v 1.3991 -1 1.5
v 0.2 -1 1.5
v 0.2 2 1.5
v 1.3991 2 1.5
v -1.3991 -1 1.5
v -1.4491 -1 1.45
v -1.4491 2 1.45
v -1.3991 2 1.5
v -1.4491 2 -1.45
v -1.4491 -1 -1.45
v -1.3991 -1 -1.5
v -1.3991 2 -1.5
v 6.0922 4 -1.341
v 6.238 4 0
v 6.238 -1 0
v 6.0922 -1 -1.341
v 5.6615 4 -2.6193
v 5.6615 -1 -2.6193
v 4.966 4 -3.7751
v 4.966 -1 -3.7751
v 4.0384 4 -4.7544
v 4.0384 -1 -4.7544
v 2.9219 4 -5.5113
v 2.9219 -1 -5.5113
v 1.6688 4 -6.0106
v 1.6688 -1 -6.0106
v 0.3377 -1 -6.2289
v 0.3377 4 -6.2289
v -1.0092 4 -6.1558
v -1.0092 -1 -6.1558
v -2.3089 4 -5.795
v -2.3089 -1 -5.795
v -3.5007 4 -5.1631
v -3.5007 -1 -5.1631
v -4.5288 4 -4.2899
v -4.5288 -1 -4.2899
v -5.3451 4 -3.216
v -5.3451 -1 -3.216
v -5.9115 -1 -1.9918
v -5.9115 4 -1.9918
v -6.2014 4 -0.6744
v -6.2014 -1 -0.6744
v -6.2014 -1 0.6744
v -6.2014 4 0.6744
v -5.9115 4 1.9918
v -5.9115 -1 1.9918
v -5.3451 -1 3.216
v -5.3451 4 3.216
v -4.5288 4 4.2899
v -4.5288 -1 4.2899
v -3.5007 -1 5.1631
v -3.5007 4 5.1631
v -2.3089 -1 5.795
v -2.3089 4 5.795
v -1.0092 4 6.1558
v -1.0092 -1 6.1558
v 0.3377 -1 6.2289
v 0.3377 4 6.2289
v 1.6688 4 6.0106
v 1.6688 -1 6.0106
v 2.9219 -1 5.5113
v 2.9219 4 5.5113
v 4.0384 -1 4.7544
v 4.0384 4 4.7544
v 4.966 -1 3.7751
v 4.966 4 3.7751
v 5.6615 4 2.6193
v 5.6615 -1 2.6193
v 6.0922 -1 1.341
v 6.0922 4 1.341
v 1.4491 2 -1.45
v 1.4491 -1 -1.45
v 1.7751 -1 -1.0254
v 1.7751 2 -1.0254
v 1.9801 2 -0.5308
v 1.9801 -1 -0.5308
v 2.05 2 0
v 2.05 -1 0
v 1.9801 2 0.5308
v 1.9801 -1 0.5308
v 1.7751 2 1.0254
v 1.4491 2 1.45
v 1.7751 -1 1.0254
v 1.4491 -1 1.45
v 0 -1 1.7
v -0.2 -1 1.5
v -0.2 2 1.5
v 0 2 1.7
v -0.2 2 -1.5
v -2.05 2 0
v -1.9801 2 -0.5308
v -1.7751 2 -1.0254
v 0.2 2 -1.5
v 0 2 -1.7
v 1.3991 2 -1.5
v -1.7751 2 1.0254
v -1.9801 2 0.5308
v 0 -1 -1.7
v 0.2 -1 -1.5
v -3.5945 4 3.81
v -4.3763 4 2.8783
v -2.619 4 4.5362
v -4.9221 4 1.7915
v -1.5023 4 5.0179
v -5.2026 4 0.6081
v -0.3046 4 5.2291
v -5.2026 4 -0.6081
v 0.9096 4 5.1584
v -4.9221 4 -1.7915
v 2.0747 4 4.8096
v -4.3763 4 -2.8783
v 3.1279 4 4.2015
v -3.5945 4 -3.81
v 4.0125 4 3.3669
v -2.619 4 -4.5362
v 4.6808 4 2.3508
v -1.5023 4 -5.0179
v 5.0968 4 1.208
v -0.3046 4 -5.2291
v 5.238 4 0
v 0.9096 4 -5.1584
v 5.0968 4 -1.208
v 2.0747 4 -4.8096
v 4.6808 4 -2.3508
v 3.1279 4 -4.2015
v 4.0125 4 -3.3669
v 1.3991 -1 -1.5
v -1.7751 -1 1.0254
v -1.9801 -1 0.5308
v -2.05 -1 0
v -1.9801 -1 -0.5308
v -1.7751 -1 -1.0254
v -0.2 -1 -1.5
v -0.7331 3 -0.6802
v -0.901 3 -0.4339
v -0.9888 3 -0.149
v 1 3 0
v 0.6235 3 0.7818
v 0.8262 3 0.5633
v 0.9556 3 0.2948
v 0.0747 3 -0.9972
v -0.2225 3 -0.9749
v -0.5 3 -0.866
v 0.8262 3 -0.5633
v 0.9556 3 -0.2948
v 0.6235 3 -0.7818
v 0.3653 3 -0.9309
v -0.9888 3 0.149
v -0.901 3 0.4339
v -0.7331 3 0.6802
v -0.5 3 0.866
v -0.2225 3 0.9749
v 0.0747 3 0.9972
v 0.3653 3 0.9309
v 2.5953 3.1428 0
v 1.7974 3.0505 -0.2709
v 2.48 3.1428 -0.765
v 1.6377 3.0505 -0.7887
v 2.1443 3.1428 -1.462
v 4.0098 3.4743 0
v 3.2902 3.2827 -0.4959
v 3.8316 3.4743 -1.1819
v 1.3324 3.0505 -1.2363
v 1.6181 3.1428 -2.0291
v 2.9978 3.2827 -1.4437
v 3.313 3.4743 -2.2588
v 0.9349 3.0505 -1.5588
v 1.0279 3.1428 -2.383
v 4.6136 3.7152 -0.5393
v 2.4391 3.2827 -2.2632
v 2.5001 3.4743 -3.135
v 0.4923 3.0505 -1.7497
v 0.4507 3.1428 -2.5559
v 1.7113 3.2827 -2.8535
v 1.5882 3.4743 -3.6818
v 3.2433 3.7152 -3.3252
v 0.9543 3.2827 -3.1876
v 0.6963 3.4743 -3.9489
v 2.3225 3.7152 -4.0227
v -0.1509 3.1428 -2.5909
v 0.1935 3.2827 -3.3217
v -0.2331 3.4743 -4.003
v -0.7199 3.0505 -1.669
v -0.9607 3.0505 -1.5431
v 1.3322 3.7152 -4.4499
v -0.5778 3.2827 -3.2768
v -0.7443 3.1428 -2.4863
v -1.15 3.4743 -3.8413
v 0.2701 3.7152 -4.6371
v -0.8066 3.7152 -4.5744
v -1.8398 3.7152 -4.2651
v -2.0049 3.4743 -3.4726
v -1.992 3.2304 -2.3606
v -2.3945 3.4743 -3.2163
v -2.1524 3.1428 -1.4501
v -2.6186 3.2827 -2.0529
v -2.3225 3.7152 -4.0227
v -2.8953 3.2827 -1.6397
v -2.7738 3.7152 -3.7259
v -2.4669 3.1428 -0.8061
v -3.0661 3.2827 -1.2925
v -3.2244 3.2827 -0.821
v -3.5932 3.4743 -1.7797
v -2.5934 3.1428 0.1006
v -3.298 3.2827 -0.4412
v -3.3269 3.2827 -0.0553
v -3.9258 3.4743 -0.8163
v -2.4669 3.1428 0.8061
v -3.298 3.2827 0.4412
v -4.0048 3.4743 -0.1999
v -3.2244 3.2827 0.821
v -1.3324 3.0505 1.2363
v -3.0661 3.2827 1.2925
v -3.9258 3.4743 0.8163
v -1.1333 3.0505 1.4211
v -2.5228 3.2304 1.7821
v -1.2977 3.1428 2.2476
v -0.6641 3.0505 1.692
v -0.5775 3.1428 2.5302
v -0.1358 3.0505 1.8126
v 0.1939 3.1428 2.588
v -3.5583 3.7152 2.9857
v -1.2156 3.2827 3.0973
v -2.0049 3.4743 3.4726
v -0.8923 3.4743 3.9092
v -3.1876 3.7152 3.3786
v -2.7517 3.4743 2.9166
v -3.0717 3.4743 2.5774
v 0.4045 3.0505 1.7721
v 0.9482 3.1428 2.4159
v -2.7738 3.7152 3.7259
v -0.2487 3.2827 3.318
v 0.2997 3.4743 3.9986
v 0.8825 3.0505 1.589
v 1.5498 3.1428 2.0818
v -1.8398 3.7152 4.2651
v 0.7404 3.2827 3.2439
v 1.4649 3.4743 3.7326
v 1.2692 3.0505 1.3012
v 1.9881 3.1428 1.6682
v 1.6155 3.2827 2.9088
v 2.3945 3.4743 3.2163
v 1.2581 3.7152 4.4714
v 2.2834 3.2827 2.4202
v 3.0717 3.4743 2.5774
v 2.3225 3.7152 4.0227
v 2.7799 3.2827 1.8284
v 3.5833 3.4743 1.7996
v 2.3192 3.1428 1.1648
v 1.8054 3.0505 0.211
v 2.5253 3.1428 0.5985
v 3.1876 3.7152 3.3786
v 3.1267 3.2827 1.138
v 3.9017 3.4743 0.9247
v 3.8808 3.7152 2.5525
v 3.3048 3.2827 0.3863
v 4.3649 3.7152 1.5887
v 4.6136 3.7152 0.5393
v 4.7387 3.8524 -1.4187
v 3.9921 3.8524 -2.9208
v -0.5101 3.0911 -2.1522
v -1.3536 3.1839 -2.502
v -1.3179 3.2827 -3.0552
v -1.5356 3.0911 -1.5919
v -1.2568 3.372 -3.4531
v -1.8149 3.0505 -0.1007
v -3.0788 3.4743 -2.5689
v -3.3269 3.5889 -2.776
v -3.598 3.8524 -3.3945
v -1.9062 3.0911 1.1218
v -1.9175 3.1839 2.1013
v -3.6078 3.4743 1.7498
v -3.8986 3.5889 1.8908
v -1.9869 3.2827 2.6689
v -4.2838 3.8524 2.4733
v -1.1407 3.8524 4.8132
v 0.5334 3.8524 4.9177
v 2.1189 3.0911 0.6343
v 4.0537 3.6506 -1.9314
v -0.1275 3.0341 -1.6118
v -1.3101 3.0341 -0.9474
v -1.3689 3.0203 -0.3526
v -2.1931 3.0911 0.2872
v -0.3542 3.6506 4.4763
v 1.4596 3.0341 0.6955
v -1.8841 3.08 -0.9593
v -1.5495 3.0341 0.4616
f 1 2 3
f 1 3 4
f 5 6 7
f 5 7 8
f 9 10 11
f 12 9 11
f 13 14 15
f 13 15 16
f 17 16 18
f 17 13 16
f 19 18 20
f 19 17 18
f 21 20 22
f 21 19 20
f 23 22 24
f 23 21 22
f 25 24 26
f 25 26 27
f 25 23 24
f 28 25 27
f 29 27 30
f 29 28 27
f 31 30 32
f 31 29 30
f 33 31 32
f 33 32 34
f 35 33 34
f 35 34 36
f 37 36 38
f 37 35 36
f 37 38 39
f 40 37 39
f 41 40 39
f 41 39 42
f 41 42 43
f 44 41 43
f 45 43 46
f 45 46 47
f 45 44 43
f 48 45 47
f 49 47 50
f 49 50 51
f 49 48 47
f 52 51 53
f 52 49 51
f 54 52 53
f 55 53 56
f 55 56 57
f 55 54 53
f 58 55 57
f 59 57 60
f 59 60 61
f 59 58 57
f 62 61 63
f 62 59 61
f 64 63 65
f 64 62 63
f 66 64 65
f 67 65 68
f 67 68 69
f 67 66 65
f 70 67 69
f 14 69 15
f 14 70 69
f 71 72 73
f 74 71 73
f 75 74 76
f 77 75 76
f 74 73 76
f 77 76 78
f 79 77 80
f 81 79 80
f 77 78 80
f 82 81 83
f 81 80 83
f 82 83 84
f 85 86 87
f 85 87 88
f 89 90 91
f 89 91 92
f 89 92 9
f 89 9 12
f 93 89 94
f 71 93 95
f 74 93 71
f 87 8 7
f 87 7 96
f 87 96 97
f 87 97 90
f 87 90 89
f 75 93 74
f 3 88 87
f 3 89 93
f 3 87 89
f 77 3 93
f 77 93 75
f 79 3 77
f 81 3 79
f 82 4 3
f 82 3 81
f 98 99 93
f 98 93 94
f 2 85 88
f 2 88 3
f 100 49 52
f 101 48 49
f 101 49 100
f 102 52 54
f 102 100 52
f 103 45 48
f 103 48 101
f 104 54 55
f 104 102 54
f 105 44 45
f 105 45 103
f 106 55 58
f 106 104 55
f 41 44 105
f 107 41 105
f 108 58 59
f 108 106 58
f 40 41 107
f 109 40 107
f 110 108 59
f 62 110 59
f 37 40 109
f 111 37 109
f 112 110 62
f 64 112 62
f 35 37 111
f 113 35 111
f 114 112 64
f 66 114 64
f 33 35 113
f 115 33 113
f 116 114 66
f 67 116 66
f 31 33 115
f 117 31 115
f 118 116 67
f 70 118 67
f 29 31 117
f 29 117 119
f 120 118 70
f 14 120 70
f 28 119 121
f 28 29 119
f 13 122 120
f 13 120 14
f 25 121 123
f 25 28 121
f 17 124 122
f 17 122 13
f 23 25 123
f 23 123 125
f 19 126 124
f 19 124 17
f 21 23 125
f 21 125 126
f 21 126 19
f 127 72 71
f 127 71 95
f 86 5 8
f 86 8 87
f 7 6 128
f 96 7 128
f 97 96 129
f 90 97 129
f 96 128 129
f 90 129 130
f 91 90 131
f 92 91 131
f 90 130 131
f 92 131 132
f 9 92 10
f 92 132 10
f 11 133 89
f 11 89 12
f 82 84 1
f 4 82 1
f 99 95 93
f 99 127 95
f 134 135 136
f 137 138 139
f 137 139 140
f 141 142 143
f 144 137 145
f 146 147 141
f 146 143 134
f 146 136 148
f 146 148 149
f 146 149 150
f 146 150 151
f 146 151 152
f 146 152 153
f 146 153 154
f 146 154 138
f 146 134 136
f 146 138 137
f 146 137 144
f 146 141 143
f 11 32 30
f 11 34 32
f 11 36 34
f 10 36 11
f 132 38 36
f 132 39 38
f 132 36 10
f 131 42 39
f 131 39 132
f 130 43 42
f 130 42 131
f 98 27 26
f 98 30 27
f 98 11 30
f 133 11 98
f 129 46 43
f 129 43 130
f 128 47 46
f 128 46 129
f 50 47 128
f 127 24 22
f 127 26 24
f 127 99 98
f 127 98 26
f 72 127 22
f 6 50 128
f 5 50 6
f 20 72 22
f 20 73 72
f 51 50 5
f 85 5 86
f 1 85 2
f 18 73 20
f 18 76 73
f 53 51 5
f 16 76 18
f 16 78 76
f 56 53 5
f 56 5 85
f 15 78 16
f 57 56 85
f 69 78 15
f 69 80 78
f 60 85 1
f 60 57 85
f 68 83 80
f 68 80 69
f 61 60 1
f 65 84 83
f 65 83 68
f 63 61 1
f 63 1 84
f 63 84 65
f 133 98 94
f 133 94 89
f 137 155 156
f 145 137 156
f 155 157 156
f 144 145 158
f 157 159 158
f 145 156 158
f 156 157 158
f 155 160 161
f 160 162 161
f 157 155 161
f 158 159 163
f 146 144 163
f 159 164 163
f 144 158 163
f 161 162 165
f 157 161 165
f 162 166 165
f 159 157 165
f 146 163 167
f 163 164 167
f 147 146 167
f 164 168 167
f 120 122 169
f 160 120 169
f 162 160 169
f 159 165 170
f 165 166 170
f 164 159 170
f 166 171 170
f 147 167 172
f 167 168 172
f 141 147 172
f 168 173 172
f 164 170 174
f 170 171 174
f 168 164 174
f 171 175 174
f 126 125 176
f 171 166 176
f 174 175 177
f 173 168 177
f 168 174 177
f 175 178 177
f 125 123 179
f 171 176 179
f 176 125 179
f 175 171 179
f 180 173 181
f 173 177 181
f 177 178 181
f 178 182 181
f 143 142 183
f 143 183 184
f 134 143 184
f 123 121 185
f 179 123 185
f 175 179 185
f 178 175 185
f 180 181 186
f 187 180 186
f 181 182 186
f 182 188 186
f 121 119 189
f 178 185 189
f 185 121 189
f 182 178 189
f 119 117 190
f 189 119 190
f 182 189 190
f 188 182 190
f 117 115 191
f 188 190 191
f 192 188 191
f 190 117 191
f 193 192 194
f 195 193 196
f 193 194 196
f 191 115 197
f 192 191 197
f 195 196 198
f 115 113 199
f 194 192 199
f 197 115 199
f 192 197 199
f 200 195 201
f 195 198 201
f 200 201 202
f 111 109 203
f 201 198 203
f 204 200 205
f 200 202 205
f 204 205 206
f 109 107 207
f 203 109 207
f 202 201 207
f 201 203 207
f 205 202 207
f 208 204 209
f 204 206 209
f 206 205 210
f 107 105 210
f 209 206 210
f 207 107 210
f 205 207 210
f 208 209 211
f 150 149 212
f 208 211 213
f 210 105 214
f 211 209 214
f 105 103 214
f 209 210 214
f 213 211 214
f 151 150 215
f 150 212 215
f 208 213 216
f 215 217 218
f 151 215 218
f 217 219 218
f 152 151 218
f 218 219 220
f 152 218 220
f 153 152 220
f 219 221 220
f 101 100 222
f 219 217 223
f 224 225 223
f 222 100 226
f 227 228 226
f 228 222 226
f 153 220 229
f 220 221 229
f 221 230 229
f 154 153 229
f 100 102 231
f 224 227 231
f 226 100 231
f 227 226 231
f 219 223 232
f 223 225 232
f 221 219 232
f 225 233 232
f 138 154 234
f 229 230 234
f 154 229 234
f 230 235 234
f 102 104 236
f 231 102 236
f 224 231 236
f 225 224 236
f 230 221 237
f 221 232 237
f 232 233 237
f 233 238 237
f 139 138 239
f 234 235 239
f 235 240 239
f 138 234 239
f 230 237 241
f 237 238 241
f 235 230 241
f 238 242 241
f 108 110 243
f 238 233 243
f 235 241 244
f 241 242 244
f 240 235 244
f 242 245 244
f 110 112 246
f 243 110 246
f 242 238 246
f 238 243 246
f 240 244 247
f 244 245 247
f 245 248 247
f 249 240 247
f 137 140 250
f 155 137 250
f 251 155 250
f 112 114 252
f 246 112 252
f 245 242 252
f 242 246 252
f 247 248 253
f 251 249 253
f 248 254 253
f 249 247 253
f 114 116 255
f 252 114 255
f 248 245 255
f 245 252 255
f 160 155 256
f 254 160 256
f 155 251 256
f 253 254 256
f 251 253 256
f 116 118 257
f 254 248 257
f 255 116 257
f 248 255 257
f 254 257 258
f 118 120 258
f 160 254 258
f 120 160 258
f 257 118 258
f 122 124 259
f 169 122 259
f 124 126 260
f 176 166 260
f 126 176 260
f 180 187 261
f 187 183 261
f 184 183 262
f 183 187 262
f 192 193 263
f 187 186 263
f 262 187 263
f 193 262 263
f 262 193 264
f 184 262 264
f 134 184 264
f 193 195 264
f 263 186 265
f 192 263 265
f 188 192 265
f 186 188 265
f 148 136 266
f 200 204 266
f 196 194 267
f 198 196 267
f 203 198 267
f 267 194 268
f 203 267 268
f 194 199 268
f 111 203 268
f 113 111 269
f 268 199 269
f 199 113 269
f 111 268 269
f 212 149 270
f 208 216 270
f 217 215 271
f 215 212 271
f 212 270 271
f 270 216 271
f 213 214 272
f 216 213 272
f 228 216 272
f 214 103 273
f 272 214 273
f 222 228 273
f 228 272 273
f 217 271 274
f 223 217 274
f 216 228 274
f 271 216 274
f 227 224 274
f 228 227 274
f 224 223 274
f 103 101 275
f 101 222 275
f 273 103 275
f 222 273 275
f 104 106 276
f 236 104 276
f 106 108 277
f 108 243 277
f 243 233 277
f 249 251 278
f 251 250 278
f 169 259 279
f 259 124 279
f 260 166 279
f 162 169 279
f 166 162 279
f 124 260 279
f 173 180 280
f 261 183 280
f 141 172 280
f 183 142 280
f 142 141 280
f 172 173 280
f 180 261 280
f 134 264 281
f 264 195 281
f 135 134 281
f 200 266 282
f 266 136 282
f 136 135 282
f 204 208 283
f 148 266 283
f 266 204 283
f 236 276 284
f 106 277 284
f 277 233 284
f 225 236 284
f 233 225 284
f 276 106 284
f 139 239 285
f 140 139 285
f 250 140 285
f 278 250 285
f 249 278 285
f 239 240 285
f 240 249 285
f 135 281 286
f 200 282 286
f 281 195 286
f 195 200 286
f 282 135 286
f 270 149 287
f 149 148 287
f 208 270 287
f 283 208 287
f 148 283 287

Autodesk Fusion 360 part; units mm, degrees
sketch "スケッチ1" plane through (0, 0, 0) normal (0, 0, 1) x (1, 0, 0)
  line L0 (0, 0) -> (0.238, 0)
  line L1 (0.238, 0) -> (6.238, 0)
  line L2 (6.238, 0) -> (6.238, 4)
  line L3 (0, 0) -> (0, 3)
  line L4 (0, 3) -> (1, 3)
  line L5 (6.238, 4) -> (5.238, 4)
  spline S0 degree 5 poles (1, 3) (1.1004, 3.0037) (1.2998, 3.0125) (1.5949, 3.0299) (1.9802, 3.0617) (2.4472, 3.1166) (2.8983, 3.1882) (3.3319, 3.2779) (3.7472, 3.3868) (4.1446, 3.5143) (4.5253, 3.6593) (4.8176, 3.7881) (5.0303, 3.8915) (5.1692, 3.9633) (5.238, 4) knots 0 0 0 0 0 0 0.1 0.2 0.3 0.4 0.5 0.6 0.7 0.8 0.9 1 1 1 1 1 1
  point P0 (3.4, 3.3)
  dimension "d1" = 6
  dimension "d2" = 4
  dimension "d3" = 3
  dimension "d4" = 1
revolve "回転1" add sketch "スケッチ1" angle 360 about axis through (0, 0, 0) along (0, 1, 0)
sketch "スケッチ2" plane through (0, 0, 0) normal (0, -1, 0) x (1, 0, 0)
  circle A0 centre (0, 0) radius 6.238
  circle A1 centre (0, 0) radius 2.1
  line L0 (0, 0) -> (0, 1.5)
  line L1 (0, 1.5) -> (1.4697, 1.5)
  line L2 (0, 1.5) -> (-1.4697, 1.5)
  line L3 (0, 0) -> (0, -1.5)
  line L4 (0, -1.5) -> (1.4697, -1.5)
  line L5 (0, -1.5) -> (-1.4697, -1.5)
  dimension "d6" = 4.2
  dimension "d7" = 1.5
  dimension "d8" = 1.5
extrude "押し出し1" cut sketch "スケッチ2" against normal blind 2 contours A1 L0 L1 L3 L4 | A1 L0 L2 L3 L5
sketch "スケッチ3" plane through (0, 0, 0) normal (0, -1, 0) x (1, 0, 0)
  line L0 (-1.4697, 1.5) -> (1.4697, 1.5)
  arc A0 (1.4697, -1.5) -> (1.4697, 1.5) centre (0, 0) ccw
  line L1 (1.4697, -1.5) -> (-1.4697, -1.5)
  arc A1 (-1.4697, 1.5) -> (-1.4697, -1.5) centre (0, 0) ccw
  circle A2 centre (0, 0) radius 6.238
  line L2 (0, 1.5) -> (0.2, 1.5)
  line L3 (0, 1.5) -> (-0.2, 1.5)
  line L4 (0, 1.5) -> (0, 1.7)
  line L5 (-0.2, 1.5) -> (0, 1.7)
  line L6 (0, 1.7) -> (0.2, 1.5)
  line L7 (0, -1.5) -> (0.2, -1.5)
  line L8 (0, -1.5) -> (-0.2, -1.5)
  line L9 (0, -1.5) -> (0, -1.7)
  line L10 (0, -1.7) -> (0.2, -1.5)
  line L11 (-0.2, -1.5) -> (0, -1.7)
  dimension "d11" = 0.2
  dimension "d12" = 0.2
  dimension "d13" = 0.2
  dimension "d14" = 0.2
  dimension "d15" = 0.2
  dimension "d16" = 0.2
extrude "押し出し2" cut sketch "スケッチ3" against normal blind 2 contours L0 L3 L4 L5 | L0 L2 L4 L6 | L1 L8 L9 L11 | L1 L7 L9 L10
sketch "スケッチ4" plane through (0, 0, 0) normal (0, -1, 0) x (1, 0, 0)
  line L0 (0, 1.7) -> (0.2, 1.5)
  line L1 (0.2, 1.5) -> (1.4697, 1.5)
  arc A0 (1.4697, -1.5) -> (1.4697, 1.5) centre (0, 0) ccw
  line L2 (1.4697, -1.5) -> (0.2, -1.5)
  line L3 (0.2, -1.5) -> (0, -1.7)
  line L4 (0, -1.7) -> (-0.2, -1.5)
  line L5 (-0.2, -1.5) -> (-1.4697, -1.5)
  arc A1 (-1.4697, 1.5) -> (-1.4697, -1.5) centre (0, 0) ccw
  line L6 (-1.4697, 1.5) -> (-0.2, 1.5)
  line L7 (-0.2, 1.5) -> (0, 1.7)
  circle A2 centre (0, 0) radius 6.238
  line L8 (0, 1.5586) -> (0.1586, 1.4)
  line L9 (0.1586, 1.4) -> (1.4283, 1.4)
  arc A3 (1.4283, -1.4) -> (1.4283, 1.4) centre (0, 0) ccw
  line L10 (1.4283, -1.4) -> (0.1586, -1.4)
  line L11 (0.1586, -1.4) -> (0, -1.5586)
  line L12 (0, -1.5586) -> (-0.1586, -1.4)
  line L13 (-0.1586, -1.4) -> (-1.4283, -1.4)
  arc A4 (-1.4283, 1.4) -> (-1.4283, -1.4) centre (0, 0) ccw
  line L14 (-1.4283, 1.4) -> (-0.1586, 1.4)
  line L15 (-0.1586, 1.4) -> (0, 1.5586)
  dimension "d19" = 0.1
extrude "押し出し3" add sketch "スケッチ4" against normal blind 2 contours L0 L1 A0 L2 L3 L4 L5 A1 L6 L7
extrude "押し出し4" add 1 faces at (0.9388, 0, -3.0134) along direction (0, -1, 0) blind 1
sketch "スケッチ5" plane through (0, -1, 0) normal (0, -1, 0) x (1, 0, 0)
  arc A0 (-1.4283, 1.4) -> (-1.4283, -1.4) centre (0, 0) ccw
  line L0 (-1.4283, 1.4) -> (-0.1586, 1.4)
  line L1 (-0.1586, 1.4) -> (0, 1.5586)
  line L2 (0, 1.5586) -> (0.1586, 1.4)
  line L3 (0.1586, 1.4) -> (1.4283, 1.4)
  arc A1 (1.4283, -1.4) -> (1.4283, 1.4) centre (0, 0) ccw
  line L4 (1.4283, -1.4) -> (0.1586, -1.4)
  line L5 (0.1586, -1.4) -> (0, -1.5586)
  line L6 (0, -1.5586) -> (-0.1586, -1.4)
  line L7 (-0.1586, -1.4) -> (-1.4283, -1.4)
  circle A2 centre (0, 0) radius 6.238
  line L8 (0, 1.7) -> (0.2, 1.5)
  line L9 (0.2, 1.5) -> (1.4697, 1.5)
  arc A3 (1.4697, -1.5) -> (1.4697, 1.5) centre (0, 0) ccw
  line L10 (1.4697, -1.5) -> (0.2, -1.5)
  line L11 (0.2, -1.5) -> (0, -1.7)
  line L12 (0, -1.7) -> (-0.2, -1.5)
  line L13 (-0.2, -1.5) -> (-1.4697, -1.5)
  arc A4 (-1.4697, 1.5) -> (-1.4697, -1.5) centre (0, 0) ccw
  line L14 (-1.4697, 1.5) -> (-0.2, 1.5)
  line L15 (-0.2, 1.5) -> (0, 1.7)
  dimension "d24" = -0.1
extrude "押し出し5" cut sketch "スケッチ5" against normal blind 3 contours L8 L9 A3 L10 L11 L12 L13 A4 L14 L15
sketch "スケッチ6" plane through (0, -1, 0) normal (0, -1, 0) x (1, 0, 0)
  line L0 (-0.2, -1.5) -> (-1.4697, -1.5)
  arc A0 (-1.4697, 1.5) -> (-1.4697, -1.5) centre (0, 0) ccw
  line L1 (-1.4697, 1.5) -> (-0.2, 1.5)
  line L2 (-0.2, 1.5) -> (0, 1.7)
  line L3 (0, 1.7) -> (0.2, 1.5)
  line L4 (0.2, 1.5) -> (1.4697, 1.5)
  arc A1 (1.4697, -1.5) -> (1.4697, 1.5) centre (0, 0) ccw
  line L5 (1.4697, -1.5) -> (0.2, -1.5)
  line L6 (0.2, -1.5) -> (0, -1.7)
  line L7 (0, -1.7) -> (-0.2, -1.5)
  circle A2 centre (0, 0) radius 6.238
  line L8 (-0.1793, -1.45) -> (-1.4491, -1.45)
  arc A3 (-1.4491, 1.45) -> (-1.4491, -1.45) centre (0, 0) ccw
  line L9 (-1.4491, 1.45) -> (-0.1793, 1.45)
  line L10 (-0.1793, 1.45) -> (0, 1.6293)
  line L11 (0, 1.6293) -> (0.1793, 1.45)
  line L12 (0.1793, 1.45) -> (1.4491, 1.45)
  arc A4 (1.4491, -1.45) -> (1.4491, 1.45) centre (0, 0) ccw
  line L13 (1.4491, -1.45) -> (0.1793, -1.45)
  line L14 (0.1793, -1.45) -> (0, -1.6293)
  line L15 (0, -1.6293) -> (-0.1793, -1.45)
  line L16 (-1.4491, 1.45) -> (-1.3991, 1.5)
  line L17 (-1.4491, -1.45) -> (-1.3991, -1.5)
  line L18 (1.4491, -1.45) -> (1.3991, -1.5)
  line L19 (1.4491, 1.45) -> (1.3991, 1.5)
  dimension "d27" = -0.05
extrude "押し出し6" add sketch "スケッチ6" against normal blind 3 contours L0 A0 L1 A3 L16 L17 | L4 A1 L5 A4 L18 L19
